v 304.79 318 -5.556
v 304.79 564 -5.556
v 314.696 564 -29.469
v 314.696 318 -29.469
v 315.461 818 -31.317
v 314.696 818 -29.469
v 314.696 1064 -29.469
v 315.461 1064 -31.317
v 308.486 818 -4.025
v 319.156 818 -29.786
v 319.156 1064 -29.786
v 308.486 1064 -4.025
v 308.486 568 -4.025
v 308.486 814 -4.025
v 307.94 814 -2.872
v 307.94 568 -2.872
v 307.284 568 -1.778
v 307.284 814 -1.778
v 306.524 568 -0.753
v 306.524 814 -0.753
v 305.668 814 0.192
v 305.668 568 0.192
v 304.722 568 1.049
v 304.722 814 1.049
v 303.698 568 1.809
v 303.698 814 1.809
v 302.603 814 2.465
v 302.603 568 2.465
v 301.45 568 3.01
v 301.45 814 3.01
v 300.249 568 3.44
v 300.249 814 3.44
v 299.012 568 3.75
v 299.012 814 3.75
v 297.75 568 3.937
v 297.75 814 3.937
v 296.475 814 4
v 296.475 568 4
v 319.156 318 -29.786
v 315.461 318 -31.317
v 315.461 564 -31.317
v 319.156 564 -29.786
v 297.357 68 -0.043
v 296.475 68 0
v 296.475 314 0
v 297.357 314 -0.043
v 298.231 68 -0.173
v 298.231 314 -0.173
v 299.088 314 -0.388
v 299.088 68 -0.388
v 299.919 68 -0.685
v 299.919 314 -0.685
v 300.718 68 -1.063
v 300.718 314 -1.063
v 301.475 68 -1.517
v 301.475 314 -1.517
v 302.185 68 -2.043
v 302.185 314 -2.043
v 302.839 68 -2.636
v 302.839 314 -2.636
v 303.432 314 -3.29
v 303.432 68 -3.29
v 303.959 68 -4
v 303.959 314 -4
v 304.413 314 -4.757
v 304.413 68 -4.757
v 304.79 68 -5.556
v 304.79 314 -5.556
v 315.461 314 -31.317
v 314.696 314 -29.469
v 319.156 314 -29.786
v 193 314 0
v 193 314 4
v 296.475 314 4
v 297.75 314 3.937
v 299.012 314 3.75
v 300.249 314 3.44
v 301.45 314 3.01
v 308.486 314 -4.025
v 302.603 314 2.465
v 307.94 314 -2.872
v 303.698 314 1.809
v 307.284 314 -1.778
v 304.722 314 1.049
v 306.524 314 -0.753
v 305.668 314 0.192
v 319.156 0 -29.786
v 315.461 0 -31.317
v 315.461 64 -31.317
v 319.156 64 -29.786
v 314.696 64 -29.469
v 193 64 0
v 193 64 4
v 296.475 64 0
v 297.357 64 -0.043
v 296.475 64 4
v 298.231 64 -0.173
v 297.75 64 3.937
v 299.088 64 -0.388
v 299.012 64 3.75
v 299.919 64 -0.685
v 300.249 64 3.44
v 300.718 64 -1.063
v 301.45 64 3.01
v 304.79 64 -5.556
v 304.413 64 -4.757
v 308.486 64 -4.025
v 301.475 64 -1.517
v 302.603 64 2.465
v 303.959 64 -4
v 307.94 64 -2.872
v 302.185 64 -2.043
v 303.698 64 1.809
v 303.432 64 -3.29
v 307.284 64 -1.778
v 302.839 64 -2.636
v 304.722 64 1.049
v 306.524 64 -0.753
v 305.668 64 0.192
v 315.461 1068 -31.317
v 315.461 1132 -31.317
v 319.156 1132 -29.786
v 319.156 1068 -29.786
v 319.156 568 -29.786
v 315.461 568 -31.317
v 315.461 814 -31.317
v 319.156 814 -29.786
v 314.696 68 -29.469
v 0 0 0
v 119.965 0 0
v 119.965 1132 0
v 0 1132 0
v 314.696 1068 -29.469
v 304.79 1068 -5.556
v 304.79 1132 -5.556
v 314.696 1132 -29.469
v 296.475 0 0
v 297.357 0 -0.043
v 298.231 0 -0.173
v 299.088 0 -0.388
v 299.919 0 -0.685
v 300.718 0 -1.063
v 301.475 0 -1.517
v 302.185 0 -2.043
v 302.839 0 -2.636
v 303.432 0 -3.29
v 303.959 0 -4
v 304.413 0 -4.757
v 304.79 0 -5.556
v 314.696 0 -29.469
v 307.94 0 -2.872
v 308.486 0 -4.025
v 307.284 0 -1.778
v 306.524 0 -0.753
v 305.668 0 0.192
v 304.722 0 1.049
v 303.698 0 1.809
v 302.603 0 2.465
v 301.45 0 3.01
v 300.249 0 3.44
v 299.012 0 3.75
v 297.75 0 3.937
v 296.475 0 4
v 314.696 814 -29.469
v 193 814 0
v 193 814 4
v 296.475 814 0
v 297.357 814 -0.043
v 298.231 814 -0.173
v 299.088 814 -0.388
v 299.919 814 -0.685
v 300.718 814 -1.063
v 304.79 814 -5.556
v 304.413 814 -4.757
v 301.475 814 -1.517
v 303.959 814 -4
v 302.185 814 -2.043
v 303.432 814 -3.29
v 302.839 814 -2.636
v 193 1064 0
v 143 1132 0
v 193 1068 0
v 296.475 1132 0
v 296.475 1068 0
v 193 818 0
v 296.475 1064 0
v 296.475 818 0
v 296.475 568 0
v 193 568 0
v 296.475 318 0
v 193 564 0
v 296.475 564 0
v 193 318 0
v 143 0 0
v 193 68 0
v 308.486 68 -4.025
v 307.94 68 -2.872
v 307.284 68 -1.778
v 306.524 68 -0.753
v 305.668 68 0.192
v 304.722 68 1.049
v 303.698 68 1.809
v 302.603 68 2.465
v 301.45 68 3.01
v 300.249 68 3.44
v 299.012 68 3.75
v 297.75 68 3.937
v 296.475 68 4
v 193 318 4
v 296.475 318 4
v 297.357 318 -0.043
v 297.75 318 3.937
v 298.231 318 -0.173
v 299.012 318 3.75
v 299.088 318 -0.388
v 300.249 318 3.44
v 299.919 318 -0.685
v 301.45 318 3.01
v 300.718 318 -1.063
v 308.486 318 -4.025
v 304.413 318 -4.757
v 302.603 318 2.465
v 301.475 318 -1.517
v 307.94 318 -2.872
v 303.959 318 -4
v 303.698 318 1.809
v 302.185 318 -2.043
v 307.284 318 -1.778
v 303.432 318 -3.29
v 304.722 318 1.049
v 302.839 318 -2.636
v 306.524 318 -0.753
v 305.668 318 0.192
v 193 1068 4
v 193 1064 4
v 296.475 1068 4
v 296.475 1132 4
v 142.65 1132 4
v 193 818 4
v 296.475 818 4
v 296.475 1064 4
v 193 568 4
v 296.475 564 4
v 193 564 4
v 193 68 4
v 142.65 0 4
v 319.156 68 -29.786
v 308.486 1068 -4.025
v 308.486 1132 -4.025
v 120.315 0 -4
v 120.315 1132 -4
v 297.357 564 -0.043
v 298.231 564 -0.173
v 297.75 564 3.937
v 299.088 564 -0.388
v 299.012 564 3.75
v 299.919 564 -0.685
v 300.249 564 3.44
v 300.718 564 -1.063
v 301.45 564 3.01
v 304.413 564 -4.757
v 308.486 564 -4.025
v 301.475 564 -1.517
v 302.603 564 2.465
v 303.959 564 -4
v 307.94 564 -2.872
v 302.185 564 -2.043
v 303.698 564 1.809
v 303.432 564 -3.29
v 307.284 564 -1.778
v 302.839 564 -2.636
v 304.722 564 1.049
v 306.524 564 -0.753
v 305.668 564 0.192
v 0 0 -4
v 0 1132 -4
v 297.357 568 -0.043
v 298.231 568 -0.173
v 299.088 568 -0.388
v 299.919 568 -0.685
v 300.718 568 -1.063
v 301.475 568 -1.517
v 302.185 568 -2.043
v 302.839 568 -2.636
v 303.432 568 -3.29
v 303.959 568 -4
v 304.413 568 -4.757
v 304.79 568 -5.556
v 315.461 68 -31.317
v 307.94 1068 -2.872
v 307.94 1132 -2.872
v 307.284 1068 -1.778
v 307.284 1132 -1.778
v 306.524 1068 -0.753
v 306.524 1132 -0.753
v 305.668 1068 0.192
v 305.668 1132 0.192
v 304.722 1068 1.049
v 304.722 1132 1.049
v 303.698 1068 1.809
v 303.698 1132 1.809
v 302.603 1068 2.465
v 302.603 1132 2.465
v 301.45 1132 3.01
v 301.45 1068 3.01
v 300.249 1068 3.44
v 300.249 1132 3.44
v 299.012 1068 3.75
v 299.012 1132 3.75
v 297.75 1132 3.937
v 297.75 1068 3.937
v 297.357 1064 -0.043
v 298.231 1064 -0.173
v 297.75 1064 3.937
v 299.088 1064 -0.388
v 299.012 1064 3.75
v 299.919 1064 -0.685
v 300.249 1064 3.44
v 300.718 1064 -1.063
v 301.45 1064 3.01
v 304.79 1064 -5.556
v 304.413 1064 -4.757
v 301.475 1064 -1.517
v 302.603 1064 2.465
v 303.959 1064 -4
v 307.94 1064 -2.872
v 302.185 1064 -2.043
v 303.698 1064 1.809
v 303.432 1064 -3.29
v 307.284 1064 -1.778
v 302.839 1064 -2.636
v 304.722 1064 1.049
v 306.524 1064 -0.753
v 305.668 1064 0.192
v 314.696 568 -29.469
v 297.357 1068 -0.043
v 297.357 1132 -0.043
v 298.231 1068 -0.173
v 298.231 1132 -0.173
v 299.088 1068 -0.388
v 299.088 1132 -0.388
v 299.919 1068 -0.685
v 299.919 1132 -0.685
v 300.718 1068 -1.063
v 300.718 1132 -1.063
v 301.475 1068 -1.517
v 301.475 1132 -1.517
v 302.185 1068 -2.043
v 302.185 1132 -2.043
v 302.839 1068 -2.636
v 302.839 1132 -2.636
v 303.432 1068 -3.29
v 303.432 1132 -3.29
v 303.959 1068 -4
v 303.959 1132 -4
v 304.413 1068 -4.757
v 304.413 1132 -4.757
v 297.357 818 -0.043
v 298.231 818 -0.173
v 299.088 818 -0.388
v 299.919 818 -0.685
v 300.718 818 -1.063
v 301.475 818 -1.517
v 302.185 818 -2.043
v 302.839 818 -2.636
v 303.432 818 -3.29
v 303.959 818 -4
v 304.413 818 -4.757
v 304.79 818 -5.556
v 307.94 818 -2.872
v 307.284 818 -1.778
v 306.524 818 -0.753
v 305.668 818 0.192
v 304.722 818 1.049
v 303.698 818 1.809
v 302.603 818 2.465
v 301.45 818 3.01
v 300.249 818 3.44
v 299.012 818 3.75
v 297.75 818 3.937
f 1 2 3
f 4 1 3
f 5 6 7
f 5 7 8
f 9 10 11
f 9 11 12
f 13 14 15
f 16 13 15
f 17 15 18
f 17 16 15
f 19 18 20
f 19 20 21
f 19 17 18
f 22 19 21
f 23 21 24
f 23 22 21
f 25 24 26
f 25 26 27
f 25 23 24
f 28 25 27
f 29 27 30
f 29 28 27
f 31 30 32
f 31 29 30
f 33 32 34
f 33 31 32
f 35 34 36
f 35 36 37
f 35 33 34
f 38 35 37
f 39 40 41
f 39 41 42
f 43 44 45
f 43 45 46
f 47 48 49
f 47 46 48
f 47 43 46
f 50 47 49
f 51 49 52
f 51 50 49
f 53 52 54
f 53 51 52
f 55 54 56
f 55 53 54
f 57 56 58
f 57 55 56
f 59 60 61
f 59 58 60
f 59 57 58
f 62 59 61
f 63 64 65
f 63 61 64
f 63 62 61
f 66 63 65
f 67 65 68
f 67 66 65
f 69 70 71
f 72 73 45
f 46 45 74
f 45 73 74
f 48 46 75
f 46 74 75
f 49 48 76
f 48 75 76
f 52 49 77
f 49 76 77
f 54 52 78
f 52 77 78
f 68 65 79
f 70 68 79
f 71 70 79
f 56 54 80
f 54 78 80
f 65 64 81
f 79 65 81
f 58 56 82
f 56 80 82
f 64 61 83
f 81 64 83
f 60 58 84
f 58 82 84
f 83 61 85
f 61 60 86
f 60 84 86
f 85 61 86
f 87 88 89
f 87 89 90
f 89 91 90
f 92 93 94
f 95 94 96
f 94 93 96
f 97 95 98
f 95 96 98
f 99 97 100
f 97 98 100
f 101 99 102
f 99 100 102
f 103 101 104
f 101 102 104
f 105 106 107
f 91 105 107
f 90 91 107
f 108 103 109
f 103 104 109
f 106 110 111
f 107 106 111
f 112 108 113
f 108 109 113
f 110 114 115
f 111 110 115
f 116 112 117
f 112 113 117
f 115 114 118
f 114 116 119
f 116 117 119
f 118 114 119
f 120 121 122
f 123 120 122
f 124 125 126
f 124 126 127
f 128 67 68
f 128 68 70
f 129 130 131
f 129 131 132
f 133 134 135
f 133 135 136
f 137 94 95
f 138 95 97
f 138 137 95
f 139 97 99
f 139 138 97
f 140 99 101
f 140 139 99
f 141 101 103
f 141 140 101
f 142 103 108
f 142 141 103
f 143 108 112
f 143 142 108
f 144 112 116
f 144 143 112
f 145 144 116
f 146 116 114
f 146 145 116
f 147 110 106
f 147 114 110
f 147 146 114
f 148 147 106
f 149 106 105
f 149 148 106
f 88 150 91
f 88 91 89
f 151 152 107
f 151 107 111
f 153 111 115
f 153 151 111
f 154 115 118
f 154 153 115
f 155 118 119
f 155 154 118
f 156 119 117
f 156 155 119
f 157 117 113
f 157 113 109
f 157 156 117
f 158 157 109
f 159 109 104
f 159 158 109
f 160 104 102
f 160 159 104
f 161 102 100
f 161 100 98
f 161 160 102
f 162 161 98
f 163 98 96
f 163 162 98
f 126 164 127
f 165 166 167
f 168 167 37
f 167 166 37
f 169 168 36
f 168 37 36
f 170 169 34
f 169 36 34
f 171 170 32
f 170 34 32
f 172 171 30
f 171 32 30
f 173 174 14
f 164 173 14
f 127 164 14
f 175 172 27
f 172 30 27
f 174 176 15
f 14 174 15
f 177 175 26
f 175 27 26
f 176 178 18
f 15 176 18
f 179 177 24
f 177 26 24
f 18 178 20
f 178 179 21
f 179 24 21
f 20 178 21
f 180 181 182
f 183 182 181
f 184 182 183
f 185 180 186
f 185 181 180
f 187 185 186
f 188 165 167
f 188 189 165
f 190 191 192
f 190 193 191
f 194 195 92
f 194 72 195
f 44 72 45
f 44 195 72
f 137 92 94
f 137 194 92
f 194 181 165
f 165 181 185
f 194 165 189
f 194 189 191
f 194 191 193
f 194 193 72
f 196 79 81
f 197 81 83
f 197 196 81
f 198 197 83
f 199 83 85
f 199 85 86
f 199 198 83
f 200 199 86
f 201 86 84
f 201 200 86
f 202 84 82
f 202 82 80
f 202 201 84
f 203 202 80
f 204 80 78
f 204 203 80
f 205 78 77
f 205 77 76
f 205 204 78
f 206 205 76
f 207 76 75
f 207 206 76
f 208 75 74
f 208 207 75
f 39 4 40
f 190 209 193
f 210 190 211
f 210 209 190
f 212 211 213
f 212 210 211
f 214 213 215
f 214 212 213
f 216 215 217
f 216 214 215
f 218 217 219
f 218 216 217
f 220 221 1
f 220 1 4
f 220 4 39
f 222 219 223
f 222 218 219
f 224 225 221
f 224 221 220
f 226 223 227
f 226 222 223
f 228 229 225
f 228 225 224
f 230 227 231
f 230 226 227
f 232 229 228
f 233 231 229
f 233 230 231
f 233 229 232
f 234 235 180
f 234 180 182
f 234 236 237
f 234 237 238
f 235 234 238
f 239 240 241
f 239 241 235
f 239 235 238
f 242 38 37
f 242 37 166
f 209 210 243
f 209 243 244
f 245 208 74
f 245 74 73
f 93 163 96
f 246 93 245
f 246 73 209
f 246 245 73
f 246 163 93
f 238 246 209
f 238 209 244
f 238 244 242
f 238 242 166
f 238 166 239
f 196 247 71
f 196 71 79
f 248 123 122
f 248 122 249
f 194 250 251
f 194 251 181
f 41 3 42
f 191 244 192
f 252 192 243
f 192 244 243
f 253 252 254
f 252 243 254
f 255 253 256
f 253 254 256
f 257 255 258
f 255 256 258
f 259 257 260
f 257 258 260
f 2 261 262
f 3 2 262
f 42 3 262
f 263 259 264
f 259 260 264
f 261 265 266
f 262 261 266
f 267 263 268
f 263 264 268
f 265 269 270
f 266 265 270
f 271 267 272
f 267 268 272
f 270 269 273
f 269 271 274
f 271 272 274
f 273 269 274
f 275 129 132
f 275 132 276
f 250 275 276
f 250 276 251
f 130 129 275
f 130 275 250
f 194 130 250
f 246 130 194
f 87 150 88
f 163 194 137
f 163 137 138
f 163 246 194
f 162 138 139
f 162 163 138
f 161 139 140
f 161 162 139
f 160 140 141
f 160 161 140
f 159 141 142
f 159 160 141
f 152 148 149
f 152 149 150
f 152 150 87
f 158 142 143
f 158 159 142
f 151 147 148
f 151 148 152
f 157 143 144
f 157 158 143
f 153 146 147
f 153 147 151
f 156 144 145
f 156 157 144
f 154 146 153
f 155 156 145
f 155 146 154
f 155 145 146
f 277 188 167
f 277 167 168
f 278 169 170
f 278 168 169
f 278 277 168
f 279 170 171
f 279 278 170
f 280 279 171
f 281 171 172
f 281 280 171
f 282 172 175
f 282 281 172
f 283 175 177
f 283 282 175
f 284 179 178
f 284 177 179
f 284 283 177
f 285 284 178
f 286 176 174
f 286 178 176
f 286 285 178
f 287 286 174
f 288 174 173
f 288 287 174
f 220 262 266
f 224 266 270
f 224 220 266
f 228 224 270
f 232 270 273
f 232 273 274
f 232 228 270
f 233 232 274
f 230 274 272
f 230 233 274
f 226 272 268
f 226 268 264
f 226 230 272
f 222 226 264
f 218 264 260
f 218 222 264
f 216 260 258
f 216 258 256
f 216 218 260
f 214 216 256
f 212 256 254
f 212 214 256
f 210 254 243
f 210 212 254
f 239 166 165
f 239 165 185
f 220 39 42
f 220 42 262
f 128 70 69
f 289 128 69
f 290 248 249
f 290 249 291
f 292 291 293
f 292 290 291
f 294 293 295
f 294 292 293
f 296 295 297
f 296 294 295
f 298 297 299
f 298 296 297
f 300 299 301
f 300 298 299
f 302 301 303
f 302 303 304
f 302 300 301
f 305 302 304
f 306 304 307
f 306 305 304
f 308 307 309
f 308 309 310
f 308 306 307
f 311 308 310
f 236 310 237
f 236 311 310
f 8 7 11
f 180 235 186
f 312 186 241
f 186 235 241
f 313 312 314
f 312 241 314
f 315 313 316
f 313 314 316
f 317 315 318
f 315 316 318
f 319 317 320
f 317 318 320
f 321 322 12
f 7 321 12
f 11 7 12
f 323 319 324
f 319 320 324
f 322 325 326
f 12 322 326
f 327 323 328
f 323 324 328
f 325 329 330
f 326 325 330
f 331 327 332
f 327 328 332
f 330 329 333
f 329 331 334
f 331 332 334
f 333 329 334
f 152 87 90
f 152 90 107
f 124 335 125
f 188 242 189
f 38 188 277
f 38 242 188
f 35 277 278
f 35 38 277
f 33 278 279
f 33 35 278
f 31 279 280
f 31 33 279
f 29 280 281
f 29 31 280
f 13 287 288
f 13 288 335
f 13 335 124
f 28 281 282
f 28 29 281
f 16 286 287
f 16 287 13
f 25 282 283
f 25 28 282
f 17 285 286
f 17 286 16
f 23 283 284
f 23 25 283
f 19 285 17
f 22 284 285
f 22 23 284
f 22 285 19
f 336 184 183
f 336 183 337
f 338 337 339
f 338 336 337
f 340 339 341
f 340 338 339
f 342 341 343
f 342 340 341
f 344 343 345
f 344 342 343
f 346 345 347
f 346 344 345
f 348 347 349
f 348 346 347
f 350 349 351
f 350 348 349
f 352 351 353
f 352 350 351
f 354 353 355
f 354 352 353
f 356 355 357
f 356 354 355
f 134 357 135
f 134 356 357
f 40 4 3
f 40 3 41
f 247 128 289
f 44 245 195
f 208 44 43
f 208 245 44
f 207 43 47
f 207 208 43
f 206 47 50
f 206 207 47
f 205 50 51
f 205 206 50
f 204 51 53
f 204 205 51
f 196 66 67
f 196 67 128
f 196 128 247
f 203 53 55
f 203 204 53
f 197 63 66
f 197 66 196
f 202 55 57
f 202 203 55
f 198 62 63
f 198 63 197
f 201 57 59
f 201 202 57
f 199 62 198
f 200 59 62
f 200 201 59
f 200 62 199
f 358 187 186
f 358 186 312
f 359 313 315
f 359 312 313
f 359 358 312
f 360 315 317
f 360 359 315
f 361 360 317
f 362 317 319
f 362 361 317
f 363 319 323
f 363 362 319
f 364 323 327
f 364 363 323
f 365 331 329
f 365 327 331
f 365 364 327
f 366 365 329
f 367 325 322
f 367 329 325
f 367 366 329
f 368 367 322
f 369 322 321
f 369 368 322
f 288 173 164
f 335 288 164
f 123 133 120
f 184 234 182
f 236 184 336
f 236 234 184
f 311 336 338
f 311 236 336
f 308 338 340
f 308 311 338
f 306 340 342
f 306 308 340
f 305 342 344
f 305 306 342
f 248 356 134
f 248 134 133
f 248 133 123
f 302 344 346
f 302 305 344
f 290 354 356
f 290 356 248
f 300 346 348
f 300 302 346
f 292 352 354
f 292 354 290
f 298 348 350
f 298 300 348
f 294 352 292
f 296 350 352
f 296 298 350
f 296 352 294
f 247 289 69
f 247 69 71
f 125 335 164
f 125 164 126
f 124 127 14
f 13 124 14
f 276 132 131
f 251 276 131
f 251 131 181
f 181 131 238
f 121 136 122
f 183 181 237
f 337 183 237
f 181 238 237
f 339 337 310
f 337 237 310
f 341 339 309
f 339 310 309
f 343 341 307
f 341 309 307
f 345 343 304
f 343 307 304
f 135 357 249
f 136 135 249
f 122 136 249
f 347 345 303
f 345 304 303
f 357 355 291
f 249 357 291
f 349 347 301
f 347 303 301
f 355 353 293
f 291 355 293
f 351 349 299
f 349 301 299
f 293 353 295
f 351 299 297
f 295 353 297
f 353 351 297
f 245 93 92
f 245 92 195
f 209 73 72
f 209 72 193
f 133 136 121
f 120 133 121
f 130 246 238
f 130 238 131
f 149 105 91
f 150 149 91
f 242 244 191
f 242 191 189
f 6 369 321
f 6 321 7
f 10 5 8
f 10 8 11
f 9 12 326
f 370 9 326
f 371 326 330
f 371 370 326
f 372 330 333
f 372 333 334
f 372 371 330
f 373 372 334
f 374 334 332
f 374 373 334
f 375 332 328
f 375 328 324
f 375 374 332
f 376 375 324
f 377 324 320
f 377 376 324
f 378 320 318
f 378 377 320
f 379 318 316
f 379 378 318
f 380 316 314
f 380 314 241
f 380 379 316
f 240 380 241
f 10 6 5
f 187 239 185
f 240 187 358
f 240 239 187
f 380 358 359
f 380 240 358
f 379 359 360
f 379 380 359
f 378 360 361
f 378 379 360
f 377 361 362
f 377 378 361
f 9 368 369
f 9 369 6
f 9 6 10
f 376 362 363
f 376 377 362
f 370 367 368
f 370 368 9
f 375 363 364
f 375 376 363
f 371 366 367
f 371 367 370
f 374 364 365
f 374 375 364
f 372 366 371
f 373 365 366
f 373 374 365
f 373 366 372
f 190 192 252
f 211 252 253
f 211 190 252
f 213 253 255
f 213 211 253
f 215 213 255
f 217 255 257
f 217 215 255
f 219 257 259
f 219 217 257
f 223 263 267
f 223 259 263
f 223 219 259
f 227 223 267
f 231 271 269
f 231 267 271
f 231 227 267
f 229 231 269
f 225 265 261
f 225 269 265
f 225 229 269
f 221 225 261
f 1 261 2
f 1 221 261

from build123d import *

# Parameters (mm, degrees)
F1_DEPTH = 1132
F2_W     = 141.117851
F2_H     = 4
F3_DEPTH = 35.318025


with BuildPart() as f1:
    # F0 (on Front) → F1 (new body)
    with BuildSketch(Plane.XZ):
        with BuildLine():
            Line((119.964918, 0), (0, 0))
            Line((0, 0), (0, -4))
            Line((0, -4), (120.314873, -4))
            Line((120.314873, -4), (143, 0))
            Line((143, 0), (296.475341, 0))
            ThreePointArc((296.475341, 0), (301.475473, -1.516773), (304.790256, -5.555849))
            Line((304.790256, -5.555849), (314.695518, -29.469266))
            Line((314.695518, -29.469266), (315.460885, -31.317025))
            Line((315.460885, -31.317025), (319.156403, -29.786292))
            Line((319.156403, -29.786292), (308.485775, -4.025115))
            ThreePointArc((308.485775, -4.025115), (303.697754, 1.809105), (296.475341, 4))
            Line((296.475341, 4), (142.650045, 4))
            Line((142.650045, 4), (119.964918, 0))
        make_face()
    extrude(amount=-F1_DEPTH)

    # F2 (on face) → F3 (cut, through all)
    with BuildSketch(Plane.XY.offset(4)):
        with Locations((263.55897, 66)):
            Rectangle(F2_W, F2_H)
        with Locations((263.55897, 316)):
            Rectangle(F2_W, F2_H)
        with Locations((263.55897, 566)):
            Rectangle(F2_W, F2_H)
        with Locations((263.55897, 816)):
            Rectangle(F2_W, F2_H)
        with Locations((263.55897, 1066)):
            Rectangle(F2_W, F2_H)
    extrude(amount=-F3_DEPTH, mode=Mode.SUBTRACT)


solid = f1.part
